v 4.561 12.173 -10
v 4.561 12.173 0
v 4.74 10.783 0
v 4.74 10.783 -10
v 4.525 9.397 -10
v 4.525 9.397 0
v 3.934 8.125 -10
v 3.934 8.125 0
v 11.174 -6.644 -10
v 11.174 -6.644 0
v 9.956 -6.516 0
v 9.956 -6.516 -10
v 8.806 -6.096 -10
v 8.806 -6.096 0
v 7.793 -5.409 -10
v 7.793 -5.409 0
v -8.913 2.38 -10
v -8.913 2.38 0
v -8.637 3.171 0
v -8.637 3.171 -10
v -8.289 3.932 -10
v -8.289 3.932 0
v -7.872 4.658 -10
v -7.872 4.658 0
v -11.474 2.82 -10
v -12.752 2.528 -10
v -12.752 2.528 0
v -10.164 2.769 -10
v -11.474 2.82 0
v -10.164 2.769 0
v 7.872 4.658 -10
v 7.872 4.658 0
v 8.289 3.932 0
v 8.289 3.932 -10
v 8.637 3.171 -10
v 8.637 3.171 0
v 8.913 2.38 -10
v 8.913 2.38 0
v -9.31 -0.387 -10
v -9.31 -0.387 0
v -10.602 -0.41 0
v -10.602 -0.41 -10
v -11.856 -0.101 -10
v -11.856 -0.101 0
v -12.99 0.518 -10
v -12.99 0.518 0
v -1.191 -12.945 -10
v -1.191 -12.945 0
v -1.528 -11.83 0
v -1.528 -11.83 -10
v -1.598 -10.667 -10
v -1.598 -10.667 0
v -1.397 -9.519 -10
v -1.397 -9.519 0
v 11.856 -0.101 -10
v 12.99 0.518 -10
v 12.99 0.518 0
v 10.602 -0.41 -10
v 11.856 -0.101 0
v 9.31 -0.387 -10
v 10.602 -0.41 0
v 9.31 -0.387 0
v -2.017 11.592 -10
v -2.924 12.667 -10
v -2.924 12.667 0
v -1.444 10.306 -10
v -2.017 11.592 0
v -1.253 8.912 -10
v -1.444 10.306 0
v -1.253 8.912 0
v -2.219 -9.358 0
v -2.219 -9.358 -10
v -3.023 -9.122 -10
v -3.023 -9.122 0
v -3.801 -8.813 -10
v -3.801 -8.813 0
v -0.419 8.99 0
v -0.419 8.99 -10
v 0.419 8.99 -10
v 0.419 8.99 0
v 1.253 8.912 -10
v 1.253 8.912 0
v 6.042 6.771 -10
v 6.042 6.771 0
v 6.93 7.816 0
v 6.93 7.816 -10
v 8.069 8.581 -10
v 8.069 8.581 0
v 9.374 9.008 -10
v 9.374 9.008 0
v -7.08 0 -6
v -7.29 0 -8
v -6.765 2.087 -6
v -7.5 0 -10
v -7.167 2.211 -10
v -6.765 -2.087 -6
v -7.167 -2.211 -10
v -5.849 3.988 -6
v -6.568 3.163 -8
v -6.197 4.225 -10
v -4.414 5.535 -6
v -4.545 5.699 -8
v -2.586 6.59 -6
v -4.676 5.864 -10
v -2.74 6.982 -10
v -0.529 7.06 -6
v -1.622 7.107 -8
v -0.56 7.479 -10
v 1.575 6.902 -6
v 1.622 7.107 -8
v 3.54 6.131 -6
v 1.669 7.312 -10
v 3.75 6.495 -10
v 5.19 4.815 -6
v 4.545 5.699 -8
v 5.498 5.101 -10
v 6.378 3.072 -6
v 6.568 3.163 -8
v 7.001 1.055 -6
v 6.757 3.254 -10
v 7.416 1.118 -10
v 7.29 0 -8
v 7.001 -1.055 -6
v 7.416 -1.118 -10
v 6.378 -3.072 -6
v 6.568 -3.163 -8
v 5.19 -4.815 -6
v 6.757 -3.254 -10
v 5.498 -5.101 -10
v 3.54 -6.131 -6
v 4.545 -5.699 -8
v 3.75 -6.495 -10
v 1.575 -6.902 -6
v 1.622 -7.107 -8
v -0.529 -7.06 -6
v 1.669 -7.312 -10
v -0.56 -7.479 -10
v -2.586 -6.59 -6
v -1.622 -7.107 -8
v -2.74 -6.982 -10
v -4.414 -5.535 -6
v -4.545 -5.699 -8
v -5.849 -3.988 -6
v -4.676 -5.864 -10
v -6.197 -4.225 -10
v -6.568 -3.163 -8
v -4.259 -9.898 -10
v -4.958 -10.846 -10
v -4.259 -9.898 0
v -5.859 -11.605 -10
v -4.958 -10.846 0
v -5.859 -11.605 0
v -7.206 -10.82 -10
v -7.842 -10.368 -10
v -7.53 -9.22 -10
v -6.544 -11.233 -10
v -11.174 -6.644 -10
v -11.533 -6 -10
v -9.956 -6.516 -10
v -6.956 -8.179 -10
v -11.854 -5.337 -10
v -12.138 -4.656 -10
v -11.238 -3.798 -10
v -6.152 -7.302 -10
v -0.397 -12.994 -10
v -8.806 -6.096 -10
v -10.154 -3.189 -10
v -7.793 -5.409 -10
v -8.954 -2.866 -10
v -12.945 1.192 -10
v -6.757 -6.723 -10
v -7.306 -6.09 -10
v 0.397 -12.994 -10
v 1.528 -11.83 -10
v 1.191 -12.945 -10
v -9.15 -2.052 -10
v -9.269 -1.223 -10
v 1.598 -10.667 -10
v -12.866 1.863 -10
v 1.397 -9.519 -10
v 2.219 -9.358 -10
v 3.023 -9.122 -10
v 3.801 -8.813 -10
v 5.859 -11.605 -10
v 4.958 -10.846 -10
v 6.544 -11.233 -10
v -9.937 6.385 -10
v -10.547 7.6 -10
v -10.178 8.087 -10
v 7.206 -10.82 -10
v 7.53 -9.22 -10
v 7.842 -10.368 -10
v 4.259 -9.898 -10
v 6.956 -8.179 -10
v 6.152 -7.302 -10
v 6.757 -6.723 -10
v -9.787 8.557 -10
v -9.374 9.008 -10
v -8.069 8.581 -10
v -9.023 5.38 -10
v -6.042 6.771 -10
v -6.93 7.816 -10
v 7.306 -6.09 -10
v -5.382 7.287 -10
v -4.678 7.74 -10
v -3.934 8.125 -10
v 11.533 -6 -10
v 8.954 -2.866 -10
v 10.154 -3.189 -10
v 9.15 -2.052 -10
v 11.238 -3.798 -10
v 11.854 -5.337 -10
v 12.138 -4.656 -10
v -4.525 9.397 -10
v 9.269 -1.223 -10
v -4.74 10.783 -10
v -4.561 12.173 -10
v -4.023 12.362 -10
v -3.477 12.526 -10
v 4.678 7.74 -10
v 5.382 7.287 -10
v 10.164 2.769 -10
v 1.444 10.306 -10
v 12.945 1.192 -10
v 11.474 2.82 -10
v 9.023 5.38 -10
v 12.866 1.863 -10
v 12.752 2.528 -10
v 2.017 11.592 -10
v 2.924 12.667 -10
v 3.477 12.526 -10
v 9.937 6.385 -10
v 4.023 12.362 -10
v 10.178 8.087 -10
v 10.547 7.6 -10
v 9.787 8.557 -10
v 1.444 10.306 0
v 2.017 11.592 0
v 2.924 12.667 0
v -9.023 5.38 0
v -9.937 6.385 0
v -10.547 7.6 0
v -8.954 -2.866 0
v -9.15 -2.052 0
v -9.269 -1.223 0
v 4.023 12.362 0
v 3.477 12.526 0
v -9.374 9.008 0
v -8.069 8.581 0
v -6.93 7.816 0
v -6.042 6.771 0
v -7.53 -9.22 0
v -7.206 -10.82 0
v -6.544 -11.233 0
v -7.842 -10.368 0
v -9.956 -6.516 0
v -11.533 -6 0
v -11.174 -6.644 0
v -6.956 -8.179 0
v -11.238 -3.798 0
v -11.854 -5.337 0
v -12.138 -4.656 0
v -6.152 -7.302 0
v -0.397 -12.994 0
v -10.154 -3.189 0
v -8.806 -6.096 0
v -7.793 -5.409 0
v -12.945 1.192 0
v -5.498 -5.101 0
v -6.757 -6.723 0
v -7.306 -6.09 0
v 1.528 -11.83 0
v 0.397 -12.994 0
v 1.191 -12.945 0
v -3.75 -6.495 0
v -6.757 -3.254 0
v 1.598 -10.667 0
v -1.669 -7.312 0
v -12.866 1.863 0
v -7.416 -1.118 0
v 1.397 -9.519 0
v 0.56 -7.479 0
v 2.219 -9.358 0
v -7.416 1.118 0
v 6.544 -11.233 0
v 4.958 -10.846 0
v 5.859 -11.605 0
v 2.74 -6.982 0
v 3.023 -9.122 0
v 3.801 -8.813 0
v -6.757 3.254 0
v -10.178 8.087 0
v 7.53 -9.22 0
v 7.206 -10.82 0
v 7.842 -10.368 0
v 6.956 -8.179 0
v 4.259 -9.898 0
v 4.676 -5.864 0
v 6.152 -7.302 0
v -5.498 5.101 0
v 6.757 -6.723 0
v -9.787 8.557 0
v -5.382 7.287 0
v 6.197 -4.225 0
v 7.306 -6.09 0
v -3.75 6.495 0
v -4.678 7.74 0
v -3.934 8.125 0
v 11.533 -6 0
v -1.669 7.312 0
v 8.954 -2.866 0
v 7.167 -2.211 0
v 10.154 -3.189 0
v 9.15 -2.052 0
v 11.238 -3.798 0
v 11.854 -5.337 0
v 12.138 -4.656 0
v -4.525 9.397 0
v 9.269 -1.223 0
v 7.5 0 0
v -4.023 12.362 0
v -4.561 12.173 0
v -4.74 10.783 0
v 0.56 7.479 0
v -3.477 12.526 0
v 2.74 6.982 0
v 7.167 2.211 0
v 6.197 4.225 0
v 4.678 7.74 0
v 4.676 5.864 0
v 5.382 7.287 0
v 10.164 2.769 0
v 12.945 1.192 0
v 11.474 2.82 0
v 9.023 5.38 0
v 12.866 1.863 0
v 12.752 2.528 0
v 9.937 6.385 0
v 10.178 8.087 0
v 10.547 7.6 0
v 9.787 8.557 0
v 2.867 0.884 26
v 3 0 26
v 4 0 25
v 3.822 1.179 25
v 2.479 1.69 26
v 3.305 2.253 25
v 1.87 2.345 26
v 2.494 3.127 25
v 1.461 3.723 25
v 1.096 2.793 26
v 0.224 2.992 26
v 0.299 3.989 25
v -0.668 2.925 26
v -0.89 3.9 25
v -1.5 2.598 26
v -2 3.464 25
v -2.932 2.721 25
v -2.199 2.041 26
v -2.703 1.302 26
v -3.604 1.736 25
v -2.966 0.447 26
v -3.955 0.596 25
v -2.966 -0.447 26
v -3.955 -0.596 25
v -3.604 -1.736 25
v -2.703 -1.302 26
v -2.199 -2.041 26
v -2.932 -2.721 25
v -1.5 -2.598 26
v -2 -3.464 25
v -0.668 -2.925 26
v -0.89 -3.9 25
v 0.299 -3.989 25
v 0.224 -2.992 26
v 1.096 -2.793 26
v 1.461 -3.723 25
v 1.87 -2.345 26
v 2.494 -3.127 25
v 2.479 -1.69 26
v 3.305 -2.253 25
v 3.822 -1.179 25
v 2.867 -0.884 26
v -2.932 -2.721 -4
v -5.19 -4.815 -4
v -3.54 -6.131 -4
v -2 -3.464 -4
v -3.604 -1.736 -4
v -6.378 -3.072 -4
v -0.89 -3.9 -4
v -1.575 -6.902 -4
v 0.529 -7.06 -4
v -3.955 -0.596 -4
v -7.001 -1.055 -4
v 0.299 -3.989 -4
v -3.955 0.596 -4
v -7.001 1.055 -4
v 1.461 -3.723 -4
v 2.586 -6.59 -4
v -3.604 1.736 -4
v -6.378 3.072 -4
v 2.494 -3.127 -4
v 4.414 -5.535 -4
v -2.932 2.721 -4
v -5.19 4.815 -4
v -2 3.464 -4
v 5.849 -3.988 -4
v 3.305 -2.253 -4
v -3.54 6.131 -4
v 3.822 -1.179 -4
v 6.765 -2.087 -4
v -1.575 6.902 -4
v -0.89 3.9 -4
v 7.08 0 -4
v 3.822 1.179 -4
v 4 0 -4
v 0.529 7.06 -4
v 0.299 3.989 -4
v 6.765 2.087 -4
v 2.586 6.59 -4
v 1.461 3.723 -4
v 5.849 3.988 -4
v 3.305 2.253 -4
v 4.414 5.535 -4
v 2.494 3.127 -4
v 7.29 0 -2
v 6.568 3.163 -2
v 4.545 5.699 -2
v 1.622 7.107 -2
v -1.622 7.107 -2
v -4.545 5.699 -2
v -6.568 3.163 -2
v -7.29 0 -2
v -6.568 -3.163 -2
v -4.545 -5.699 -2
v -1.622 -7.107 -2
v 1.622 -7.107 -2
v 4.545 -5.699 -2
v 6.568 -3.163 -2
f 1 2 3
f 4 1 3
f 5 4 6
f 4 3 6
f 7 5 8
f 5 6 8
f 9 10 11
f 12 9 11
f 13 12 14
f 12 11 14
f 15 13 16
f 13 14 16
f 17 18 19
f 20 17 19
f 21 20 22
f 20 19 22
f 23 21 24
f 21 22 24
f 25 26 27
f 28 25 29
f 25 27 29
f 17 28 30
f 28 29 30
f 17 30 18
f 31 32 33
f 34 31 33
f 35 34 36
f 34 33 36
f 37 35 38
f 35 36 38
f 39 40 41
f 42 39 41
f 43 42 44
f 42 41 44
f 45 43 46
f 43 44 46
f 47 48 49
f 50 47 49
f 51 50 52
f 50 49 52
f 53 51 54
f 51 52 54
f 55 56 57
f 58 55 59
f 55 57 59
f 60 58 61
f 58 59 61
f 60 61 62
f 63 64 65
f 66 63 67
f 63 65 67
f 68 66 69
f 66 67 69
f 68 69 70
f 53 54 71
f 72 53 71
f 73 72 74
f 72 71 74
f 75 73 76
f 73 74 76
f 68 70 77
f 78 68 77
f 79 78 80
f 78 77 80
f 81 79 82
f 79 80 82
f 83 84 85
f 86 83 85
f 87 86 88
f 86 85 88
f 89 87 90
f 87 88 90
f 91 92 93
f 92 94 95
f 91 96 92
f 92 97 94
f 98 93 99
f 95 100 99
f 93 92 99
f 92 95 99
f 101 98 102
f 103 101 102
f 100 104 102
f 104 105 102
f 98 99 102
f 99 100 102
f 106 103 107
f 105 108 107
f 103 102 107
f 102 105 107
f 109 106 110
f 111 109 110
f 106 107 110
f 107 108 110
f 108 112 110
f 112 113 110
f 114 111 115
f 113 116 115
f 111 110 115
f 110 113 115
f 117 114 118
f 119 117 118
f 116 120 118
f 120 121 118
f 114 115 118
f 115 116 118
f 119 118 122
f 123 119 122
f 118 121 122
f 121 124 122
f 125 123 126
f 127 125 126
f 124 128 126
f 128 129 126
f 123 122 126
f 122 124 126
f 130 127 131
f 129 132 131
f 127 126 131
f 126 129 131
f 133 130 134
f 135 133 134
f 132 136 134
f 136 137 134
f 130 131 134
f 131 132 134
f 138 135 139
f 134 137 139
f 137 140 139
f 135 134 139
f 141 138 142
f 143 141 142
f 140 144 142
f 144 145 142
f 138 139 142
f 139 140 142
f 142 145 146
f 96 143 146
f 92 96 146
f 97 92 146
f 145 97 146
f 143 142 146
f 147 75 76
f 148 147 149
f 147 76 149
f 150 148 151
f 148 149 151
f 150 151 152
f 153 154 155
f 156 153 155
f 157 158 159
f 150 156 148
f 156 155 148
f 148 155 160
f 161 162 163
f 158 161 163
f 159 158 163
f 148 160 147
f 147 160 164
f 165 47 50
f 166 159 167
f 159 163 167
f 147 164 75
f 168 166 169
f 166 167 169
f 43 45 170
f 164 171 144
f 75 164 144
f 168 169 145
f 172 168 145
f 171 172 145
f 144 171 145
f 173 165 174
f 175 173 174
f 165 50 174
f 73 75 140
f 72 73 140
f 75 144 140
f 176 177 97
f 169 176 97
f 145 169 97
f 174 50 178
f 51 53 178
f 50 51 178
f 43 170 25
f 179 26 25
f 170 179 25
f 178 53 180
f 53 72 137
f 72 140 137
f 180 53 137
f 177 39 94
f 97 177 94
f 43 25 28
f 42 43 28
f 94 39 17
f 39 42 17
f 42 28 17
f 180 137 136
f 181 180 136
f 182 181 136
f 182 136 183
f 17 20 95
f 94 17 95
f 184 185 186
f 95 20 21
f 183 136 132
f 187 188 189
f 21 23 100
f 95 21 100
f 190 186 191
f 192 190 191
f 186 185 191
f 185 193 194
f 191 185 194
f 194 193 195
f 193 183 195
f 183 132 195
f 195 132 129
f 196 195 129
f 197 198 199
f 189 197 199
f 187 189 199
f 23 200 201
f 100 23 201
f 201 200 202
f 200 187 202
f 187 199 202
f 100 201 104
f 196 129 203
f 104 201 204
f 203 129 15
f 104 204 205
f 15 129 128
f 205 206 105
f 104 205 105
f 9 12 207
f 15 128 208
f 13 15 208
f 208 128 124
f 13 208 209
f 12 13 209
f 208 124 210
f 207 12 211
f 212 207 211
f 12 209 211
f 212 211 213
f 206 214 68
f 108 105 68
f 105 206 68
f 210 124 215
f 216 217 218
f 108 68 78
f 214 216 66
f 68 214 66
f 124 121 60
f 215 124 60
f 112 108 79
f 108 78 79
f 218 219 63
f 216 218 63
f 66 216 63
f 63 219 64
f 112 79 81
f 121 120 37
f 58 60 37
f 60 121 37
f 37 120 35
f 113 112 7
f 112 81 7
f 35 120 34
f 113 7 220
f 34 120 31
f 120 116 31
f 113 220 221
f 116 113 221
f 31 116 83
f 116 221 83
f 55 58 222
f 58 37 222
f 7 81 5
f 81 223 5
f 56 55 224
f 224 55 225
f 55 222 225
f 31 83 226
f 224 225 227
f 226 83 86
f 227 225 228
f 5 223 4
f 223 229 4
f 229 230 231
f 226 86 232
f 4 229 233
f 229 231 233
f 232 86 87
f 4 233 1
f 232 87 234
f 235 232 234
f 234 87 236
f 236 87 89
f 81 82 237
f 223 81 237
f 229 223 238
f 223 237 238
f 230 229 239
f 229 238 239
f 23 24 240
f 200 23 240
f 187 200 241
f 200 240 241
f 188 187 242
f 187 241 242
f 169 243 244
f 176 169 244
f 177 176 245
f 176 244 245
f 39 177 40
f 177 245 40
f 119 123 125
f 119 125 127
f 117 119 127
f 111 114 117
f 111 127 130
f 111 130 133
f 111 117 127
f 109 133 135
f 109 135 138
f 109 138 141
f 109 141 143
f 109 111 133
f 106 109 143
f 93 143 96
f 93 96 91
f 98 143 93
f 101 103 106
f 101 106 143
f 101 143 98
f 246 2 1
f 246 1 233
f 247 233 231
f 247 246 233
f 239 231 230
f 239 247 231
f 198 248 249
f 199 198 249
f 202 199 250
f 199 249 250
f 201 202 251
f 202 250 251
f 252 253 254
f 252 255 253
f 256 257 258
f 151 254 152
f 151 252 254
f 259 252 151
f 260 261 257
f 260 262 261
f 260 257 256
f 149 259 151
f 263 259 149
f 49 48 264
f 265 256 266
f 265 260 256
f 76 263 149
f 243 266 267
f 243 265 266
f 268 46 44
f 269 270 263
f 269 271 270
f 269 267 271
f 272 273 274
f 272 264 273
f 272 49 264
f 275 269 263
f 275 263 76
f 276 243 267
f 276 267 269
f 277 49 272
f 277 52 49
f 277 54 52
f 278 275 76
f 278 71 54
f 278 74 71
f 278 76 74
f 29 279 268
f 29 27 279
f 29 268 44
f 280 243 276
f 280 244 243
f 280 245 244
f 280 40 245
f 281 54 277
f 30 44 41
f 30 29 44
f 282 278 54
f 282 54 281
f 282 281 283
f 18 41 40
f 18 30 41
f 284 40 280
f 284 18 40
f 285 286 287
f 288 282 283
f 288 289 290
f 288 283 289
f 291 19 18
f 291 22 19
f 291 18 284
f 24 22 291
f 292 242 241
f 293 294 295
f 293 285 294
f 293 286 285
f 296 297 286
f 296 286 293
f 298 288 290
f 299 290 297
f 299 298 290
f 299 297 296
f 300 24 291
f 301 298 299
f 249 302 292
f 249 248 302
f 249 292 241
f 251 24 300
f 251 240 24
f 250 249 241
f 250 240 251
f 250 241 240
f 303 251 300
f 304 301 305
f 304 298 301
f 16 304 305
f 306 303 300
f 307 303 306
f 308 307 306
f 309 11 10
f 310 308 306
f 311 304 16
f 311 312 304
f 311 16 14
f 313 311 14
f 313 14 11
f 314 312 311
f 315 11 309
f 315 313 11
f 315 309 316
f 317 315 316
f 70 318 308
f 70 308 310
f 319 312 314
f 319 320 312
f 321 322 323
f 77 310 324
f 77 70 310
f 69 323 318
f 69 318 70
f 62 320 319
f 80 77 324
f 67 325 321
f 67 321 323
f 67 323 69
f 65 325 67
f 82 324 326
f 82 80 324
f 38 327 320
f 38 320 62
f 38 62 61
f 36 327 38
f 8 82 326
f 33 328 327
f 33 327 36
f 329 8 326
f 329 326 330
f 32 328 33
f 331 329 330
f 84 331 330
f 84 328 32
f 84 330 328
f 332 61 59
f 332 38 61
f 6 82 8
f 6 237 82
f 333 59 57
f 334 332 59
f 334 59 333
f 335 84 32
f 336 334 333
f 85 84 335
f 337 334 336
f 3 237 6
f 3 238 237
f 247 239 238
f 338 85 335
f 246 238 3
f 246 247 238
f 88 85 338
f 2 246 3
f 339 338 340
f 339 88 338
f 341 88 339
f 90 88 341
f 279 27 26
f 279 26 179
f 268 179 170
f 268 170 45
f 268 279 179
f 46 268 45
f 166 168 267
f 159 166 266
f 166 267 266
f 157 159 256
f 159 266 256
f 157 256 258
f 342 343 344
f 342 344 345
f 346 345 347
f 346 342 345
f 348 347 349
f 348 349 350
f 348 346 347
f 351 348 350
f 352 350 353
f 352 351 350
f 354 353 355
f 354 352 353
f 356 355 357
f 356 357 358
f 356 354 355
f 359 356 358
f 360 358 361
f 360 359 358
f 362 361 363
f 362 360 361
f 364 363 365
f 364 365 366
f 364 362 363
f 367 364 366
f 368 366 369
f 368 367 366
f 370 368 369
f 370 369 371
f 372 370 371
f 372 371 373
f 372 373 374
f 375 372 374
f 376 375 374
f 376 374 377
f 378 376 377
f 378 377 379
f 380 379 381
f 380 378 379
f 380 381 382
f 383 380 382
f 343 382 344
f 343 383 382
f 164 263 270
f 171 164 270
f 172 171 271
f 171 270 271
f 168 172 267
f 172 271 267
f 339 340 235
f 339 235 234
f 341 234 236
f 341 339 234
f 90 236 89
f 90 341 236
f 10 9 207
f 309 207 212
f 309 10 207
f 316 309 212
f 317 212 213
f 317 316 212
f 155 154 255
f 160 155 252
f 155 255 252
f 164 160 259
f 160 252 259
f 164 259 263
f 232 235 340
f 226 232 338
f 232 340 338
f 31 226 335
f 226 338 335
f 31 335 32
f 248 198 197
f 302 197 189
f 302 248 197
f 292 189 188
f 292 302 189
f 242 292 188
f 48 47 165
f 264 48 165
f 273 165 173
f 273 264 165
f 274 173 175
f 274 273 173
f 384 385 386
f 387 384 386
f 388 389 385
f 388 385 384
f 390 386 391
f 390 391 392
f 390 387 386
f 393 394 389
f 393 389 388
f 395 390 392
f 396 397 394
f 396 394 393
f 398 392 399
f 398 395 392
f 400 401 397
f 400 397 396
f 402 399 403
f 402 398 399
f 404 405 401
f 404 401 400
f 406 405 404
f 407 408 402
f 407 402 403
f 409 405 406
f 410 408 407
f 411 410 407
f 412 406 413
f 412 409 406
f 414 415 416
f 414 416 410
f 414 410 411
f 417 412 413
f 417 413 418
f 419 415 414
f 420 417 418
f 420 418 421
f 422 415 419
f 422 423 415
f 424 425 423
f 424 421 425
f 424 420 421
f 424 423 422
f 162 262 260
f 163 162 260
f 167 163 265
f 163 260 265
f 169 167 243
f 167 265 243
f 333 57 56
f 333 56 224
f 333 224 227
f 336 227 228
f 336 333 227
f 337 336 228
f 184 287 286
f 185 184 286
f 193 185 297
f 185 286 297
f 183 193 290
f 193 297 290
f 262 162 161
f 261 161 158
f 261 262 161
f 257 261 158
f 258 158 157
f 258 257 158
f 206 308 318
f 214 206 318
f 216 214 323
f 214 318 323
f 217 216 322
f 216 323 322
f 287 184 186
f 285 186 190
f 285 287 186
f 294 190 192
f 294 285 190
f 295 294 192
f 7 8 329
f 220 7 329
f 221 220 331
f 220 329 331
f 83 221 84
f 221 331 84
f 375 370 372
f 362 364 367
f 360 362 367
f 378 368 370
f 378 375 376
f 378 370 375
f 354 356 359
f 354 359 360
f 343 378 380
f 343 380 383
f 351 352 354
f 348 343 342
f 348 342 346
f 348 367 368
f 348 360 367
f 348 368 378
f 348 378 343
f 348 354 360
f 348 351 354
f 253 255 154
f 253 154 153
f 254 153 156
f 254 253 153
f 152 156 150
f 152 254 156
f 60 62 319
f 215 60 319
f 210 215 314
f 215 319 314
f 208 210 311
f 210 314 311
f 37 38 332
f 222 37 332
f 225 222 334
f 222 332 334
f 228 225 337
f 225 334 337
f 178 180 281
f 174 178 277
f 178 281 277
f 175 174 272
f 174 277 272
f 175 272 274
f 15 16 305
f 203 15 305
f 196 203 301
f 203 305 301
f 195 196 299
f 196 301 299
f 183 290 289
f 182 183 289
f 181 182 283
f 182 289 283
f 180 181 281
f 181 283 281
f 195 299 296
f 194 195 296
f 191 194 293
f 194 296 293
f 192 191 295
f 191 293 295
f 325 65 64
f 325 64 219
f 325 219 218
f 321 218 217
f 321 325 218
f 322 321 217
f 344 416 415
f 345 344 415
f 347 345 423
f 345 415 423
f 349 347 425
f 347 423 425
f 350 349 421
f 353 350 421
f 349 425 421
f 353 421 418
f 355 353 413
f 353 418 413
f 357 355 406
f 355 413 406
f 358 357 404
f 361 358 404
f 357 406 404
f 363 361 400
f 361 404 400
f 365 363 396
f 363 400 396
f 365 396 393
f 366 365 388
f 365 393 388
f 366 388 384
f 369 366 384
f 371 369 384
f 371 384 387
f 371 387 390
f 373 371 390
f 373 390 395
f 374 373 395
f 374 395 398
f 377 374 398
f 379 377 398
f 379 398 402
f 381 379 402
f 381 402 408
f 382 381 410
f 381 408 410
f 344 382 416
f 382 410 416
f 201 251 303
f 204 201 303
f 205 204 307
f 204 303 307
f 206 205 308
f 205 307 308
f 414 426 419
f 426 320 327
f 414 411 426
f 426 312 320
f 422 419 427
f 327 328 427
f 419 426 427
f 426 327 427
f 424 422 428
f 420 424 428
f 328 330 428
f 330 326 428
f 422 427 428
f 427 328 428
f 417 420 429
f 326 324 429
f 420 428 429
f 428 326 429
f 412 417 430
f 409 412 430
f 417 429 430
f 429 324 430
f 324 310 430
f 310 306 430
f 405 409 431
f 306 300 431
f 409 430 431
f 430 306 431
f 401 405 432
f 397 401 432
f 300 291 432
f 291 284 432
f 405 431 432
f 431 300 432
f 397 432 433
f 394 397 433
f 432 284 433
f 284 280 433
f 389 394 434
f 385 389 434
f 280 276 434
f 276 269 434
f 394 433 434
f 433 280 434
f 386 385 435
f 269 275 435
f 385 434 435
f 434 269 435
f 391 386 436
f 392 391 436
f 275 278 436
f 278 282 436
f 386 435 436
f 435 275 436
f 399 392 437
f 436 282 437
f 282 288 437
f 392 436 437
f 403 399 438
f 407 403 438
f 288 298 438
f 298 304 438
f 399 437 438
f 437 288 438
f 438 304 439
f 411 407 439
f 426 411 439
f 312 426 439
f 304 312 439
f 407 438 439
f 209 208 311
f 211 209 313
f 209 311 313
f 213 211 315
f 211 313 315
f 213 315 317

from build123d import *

# Parameters (mm, degrees)
SKETCH_3_R               = 13
EXTRUDE_1_DEPTH          = 10
CUT_EXTRUDE_1_DEPTH      = 21.928449536
PATTERN_CIRCULAR_1_COUNT = 11
SKETCH_5_R               = 7.5
CUT_EXTRUDE_2_DEPTH      = 4
CUT_EXTRUDE_2_DRAFT      = -6
SKETCH_6_R               = 7.5
CUT_EXTRUDE_3_DEPTH      = 4
CUT_EXTRUDE_3_DRAFT      = -6
SKETCH_8_R               = 4
EXTRUDE_3_DEPTH          = 30
CHAMFER_2_SIZE           = 1


with BuildPart() as part:
    # Эскиз3 → Бобышка-Вытянуть1 (new body)
    with BuildSketch(Plane.XY):
        Circle(SKETCH_3_R)
    extrude(amount=-EXTRUDE_1_DEPTH)

    # Эскиз4 → Вырез-Вытянуть1 (cut, through all)
    with BuildSketch(Plane.XY):
        with BuildLine():
            ThreePointArc((2.924363706, 12.666810842), (0, 13), (-2.924363706, 12.666810842))
            ThreePointArc((-2.924363706, 12.666810842), (-1.684886314, 10.969320472), (-1.252557909, 8.912412619))
            ThreePointArc((-1.252557909, 8.912412619), (0, 9), (1.252557909, 8.912412619))
            ThreePointArc((1.252557909, 8.912412619), (1.684886314, 10.969320472), (2.924363706, 12.666810842))
        make_face()
    cut_extrude_1 = extrude(amount=-CUT_EXTRUDE_1_DEPTH, mode=Mode.SUBTRACT)

    # Круговой массив1: Вырез-Вытянуть1 ×11 about axis
    pattern_circular_1_axis = Axis((0, -0.313541407, 0), (0, 0, 1))
    for i in range(1, PATTERN_CIRCULAR_1_COUNT):
        add(cut_extrude_1.rotate(pattern_circular_1_axis, i * 360 / PATTERN_CIRCULAR_1_COUNT), mode=Mode.SUBTRACT)


with BuildPart() as cut_extrude_2_tool:
    # Эскиз5 → Вырез-Вытянуть2 (with draft: the straight prism first)
    with BuildSketch(Plane.XY):
        Circle(SKETCH_5_R)
    extrude(amount=-CUT_EXTRUDE_2_DEPTH)
    # Вырез-Вытянуть2: the draft: its side faces are tilted about the plane it starts from
    cut_extrude_2_sides = [cut_extrude_2_tool.faces().sort_by_distance(p)[0] for p in [
        (-7.5, 0, -2),
    ]]
    draft(cut_extrude_2_sides, Plane.XY, CUT_EXTRUDE_2_DRAFT)


with BuildPart() as part_1:
    add(part.part)

    # Вырез-Вытянуть2: cut by cut_extrude_2_tool
    add(cut_extrude_2_tool.part, mode=Mode.SUBTRACT)


with BuildPart() as cut_extrude_3_tool:
    # Эскиз6 → Вырез-Вытянуть3 (with draft: the straight prism first)
    with BuildSketch(Plane(origin=(0, 0, -10), x_dir=(-1, 0, 0), z_dir=(0, 0, -1))):
        Circle(SKETCH_6_R)
    extrude(amount=-CUT_EXTRUDE_3_DEPTH)
    # Вырез-Вытянуть3: the draft: its side faces are tilted about the plane it starts from
    cut_extrude_3_sides = [cut_extrude_3_tool.faces().sort_by_distance(p)[0] for p in [
        (7.5, 0, -8),
    ]]
    draft(cut_extrude_3_sides, Plane(origin=(0, 0, -10), x_dir=(-1, 0, 0), z_dir=(0, 0, -1)), CUT_EXTRUDE_3_DRAFT)


with BuildPart() as part_2:
    add(part_1.part)

    # Вырез-Вытянуть3: cut by cut_extrude_3_tool
    add(cut_extrude_3_tool.part, mode=Mode.SUBTRACT)

    # Эскиз8 → Бобышка-Вытянуть3 (add)
    with BuildSketch(Plane.XY.offset(-4)):
        Circle(SKETCH_8_R)
    extrude(amount=EXTRUDE_3_DEPTH)

    # Фаска2
    chamfer_2_edges = [part_2.edges().sort_by_distance(p)[0] for p in [
        (-4, 0, 26),
    ]]
    chamfer(chamfer_2_edges, length=CHAMFER_2_SIZE)


solid = part_2.part
